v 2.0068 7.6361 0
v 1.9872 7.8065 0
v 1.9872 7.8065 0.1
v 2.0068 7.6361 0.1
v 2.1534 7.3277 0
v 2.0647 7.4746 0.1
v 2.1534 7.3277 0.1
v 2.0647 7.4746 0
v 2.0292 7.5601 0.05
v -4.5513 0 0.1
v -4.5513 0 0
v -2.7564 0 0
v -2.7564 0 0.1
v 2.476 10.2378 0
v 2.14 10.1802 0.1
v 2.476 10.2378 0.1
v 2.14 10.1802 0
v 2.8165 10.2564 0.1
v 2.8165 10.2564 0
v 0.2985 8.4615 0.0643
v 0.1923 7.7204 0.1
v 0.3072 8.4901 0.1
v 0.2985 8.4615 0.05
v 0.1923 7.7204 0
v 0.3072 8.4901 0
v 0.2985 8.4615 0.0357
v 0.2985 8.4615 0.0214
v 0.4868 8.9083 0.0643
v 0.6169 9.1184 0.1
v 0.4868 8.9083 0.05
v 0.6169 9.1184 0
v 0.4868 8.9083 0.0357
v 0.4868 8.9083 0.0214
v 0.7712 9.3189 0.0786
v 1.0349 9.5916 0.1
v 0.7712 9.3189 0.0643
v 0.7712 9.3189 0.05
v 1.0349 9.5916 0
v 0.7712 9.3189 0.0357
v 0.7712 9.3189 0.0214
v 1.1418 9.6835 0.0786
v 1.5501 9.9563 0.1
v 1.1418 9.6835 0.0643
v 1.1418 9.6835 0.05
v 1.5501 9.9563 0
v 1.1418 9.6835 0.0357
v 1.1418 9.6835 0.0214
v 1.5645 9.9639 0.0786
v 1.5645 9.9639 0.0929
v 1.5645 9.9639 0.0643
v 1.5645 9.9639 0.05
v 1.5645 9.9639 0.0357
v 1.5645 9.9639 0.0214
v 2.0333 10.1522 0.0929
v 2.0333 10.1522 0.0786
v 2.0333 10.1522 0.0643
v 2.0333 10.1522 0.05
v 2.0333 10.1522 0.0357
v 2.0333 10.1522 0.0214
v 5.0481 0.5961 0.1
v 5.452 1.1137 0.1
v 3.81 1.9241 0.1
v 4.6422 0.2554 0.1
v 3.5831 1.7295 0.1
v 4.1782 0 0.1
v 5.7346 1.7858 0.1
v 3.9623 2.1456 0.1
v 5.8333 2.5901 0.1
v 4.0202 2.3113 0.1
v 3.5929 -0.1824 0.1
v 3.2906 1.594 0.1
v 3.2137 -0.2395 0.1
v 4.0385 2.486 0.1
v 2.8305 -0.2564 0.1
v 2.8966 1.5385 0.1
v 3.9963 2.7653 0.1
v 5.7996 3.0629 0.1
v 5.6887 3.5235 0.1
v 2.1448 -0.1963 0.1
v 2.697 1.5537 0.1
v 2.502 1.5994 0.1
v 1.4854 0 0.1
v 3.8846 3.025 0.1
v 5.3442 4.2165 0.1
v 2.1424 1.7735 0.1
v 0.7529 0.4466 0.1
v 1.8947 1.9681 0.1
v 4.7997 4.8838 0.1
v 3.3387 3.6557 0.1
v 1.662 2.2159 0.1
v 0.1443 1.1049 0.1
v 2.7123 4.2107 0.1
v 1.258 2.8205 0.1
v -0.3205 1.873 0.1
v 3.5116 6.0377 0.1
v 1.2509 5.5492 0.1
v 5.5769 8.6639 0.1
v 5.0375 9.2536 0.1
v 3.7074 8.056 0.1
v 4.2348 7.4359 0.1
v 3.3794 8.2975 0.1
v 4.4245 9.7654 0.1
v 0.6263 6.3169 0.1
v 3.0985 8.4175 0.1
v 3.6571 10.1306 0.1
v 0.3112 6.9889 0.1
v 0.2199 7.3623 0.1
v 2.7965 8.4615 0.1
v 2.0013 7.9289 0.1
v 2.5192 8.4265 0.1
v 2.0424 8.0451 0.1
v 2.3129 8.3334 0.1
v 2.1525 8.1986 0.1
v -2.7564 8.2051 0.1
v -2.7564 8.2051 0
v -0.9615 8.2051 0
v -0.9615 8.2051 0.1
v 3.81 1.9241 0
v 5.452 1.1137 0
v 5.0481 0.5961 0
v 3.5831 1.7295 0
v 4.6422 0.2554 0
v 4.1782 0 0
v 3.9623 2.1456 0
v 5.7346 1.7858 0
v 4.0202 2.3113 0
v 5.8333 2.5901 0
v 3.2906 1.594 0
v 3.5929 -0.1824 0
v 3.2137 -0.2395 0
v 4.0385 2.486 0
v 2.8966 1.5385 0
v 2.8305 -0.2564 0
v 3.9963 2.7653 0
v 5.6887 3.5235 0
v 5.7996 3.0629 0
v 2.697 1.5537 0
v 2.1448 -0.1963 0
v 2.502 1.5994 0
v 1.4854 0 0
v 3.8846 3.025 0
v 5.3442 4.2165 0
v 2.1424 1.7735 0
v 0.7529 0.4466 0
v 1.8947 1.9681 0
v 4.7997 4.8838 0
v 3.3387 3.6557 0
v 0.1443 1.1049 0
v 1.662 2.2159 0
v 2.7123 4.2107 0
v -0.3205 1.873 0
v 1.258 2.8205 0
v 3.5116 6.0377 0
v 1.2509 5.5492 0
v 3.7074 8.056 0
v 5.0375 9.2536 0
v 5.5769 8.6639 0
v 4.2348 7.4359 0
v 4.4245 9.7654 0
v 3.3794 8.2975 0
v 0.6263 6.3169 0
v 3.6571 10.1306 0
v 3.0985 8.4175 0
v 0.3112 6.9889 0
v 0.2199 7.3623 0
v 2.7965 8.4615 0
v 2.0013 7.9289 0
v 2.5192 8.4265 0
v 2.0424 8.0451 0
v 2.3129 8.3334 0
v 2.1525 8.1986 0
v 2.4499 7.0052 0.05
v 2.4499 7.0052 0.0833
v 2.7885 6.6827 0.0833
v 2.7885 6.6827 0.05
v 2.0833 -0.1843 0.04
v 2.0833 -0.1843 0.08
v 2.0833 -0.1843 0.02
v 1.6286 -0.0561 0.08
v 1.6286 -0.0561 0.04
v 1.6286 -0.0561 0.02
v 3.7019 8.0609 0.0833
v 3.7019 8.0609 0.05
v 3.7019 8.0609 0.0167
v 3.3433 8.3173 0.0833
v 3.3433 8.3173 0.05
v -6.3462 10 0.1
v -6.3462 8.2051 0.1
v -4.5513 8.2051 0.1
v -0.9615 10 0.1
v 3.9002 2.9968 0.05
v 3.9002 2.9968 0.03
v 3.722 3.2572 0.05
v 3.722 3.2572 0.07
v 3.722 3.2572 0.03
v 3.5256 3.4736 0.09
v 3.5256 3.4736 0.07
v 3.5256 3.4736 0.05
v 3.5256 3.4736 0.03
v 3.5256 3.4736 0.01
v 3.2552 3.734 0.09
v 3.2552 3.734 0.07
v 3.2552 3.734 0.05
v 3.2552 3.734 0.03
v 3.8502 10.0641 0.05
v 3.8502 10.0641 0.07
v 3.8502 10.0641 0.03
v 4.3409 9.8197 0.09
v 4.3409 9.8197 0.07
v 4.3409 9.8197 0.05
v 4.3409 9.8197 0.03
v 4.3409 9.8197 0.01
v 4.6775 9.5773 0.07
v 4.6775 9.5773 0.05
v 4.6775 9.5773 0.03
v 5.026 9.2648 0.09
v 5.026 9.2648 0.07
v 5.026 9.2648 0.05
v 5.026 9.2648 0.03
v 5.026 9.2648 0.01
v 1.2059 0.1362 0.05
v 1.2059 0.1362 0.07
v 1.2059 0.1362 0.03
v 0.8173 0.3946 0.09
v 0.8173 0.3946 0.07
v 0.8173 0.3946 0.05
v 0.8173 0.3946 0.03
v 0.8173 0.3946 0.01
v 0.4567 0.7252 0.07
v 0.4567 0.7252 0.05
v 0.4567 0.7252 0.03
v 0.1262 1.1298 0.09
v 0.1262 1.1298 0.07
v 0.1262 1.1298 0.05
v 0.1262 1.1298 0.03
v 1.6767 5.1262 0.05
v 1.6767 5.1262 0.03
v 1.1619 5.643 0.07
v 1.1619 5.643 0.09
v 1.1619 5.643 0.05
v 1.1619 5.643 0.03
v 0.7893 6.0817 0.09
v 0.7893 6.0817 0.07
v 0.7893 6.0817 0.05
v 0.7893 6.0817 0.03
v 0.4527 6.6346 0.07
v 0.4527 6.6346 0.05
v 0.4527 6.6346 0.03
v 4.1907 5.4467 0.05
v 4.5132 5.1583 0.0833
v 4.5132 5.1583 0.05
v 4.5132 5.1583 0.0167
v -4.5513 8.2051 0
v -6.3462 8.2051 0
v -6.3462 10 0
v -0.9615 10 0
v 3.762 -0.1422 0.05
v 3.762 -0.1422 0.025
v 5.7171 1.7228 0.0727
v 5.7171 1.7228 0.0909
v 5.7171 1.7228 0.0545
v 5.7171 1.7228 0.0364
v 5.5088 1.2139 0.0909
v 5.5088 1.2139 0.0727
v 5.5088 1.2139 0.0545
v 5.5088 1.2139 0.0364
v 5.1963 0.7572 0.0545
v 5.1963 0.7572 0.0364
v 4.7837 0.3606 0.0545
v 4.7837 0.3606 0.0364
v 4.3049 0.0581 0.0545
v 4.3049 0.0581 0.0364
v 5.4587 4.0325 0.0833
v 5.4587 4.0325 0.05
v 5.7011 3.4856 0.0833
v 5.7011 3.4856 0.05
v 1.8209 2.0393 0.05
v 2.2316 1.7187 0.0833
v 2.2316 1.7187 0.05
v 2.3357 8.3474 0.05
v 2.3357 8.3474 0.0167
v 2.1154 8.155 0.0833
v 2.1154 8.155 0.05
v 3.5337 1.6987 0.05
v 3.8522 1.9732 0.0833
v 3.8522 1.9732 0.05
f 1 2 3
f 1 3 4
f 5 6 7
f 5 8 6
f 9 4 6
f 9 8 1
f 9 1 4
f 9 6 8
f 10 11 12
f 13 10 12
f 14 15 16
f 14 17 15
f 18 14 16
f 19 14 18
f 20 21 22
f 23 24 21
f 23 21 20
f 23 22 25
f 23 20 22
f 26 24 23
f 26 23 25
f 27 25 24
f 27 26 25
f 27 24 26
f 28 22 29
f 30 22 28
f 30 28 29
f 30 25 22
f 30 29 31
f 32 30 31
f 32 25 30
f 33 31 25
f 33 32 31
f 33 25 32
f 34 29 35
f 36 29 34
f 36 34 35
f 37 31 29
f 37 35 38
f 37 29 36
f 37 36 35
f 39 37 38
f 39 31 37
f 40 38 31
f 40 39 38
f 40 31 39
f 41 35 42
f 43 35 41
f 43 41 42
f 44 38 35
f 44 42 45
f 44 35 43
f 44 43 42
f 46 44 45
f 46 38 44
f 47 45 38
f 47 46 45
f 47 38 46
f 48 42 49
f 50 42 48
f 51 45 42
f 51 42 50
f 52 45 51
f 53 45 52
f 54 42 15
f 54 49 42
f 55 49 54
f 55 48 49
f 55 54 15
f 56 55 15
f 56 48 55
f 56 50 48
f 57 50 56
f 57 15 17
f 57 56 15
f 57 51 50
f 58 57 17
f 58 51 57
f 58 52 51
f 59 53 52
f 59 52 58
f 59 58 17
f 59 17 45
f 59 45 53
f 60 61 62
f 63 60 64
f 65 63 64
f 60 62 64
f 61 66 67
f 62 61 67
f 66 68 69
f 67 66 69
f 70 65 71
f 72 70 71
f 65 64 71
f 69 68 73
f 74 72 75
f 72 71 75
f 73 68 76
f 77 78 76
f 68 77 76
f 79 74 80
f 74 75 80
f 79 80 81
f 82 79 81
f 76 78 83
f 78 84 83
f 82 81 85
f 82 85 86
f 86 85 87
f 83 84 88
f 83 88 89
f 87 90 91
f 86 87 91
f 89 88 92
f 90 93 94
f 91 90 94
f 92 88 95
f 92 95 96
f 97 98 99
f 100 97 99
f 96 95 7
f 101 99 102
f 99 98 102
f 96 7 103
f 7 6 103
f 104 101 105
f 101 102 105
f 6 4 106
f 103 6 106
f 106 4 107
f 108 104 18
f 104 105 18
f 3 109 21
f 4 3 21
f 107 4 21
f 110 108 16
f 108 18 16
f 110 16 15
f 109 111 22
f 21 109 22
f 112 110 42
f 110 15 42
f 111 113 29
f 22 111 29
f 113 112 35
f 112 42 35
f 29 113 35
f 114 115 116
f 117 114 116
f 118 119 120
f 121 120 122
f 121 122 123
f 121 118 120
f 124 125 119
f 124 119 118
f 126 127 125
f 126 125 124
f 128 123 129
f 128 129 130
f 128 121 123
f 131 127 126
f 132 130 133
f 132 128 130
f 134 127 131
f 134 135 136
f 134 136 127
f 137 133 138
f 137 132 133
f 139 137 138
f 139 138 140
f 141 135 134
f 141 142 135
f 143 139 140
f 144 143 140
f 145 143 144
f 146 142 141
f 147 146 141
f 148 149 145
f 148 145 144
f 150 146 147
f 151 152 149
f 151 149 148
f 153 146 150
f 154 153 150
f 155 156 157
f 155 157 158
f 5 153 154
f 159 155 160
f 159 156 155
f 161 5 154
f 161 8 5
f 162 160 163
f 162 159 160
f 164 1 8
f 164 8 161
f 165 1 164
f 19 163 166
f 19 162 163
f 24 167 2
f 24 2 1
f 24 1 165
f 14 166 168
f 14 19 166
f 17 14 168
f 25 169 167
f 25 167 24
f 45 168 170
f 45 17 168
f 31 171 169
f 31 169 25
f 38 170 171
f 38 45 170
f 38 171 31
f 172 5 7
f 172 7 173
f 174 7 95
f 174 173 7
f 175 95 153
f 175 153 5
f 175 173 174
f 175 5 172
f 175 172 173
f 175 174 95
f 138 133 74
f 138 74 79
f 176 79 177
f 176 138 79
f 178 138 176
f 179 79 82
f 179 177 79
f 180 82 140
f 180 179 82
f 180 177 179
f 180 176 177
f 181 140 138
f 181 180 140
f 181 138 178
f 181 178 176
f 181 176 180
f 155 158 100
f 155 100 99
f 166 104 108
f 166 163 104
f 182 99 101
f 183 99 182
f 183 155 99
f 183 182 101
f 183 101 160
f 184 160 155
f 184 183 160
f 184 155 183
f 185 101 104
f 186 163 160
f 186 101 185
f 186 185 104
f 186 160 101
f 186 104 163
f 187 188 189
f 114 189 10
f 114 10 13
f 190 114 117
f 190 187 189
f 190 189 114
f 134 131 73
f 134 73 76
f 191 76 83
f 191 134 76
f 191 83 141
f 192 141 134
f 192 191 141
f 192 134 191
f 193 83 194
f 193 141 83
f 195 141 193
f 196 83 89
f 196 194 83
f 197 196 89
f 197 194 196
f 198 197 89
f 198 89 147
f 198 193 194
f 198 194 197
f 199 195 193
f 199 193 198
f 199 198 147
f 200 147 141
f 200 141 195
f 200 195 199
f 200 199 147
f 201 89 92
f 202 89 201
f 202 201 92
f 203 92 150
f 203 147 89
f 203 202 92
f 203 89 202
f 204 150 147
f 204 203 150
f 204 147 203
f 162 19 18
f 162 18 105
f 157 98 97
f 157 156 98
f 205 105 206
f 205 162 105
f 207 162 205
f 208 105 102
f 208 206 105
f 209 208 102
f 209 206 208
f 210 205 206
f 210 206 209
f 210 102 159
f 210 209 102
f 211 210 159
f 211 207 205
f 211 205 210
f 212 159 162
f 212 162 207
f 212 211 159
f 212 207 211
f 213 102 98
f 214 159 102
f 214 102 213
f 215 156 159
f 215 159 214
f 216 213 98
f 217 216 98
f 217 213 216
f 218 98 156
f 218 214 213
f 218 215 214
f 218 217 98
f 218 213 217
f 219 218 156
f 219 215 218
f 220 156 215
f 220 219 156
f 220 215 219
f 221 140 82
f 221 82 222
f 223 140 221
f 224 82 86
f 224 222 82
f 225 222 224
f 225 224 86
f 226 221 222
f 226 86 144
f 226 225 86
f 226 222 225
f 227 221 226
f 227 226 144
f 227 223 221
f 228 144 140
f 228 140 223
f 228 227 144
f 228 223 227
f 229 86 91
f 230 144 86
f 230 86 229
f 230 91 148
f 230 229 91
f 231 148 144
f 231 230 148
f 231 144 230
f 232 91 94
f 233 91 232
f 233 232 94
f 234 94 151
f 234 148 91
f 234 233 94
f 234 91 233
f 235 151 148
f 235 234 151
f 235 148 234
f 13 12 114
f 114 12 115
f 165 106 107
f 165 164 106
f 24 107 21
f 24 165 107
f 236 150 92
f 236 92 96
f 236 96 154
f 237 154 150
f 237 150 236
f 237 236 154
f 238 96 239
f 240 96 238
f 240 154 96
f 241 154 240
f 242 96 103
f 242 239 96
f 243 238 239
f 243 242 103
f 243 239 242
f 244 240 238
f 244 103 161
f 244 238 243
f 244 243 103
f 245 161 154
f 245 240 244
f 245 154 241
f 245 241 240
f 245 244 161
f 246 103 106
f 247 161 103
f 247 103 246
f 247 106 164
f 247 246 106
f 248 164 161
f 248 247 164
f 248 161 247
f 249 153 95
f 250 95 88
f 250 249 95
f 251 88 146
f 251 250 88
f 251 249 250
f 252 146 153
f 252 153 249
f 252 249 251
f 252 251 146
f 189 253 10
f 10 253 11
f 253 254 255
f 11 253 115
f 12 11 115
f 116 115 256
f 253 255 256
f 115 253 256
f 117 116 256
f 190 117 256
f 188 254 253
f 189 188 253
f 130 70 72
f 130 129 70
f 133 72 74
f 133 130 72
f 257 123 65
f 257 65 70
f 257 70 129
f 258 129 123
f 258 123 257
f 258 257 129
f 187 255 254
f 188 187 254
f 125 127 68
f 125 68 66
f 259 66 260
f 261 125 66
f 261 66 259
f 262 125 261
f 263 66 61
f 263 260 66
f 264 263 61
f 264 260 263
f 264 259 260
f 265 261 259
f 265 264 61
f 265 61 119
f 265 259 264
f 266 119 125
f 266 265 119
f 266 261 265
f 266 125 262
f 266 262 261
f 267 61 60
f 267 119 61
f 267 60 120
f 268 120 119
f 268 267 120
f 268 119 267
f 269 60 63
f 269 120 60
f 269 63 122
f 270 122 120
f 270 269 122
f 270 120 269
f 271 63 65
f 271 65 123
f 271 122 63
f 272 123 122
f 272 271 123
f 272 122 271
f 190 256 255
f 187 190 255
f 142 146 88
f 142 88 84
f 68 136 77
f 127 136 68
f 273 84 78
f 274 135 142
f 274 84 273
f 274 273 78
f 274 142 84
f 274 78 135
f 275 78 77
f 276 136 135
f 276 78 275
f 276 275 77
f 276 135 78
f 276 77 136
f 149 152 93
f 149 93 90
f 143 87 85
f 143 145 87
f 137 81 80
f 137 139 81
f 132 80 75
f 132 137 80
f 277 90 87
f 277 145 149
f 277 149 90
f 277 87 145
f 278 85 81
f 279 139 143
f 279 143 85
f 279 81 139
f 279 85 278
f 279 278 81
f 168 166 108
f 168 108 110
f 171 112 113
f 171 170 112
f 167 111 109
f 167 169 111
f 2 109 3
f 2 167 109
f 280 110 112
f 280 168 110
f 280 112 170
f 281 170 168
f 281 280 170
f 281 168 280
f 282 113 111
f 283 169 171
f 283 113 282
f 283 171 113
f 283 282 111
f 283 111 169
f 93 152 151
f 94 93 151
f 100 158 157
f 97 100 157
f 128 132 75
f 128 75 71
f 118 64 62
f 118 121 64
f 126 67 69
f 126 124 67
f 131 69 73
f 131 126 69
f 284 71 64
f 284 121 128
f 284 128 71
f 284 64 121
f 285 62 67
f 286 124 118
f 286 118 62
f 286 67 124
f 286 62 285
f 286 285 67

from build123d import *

# Parameters (mm, degrees)
BOSS_EXTRUDE2_DEPTH = 0.1


with BuildPart() as part:
    # Sketch2 → Boss-Extrude2 (new body)
    with BuildSketch(Plane.XY):
        Polygon((-4.551282051, 8.205128205), (-4.551282051, 0), (-2.756410256, 0), (-2.756410256, 8.205128205), (-0.961538462, 8.205128205), (-0.961538462, 10), (-6.346153846, 10), (-6.346153846, 8.205128205), align=None)
        with BuildLine():
            add(Edge.make_bspline(
                [(1.48535153, 0), (1.460838, 0.010341081), (1.365882722, 0.051957676), (1.204347305, 0.133873582), (1.004767059, 0.254125506), (0.813884947, 0.393754262), (0.629286771, 0.549904551), (0.452808355, 0.724978918), (0.28359341, 0.918560312), (0.122758915, 1.13120867), (-0.092314067, 1.442815496), (-0.230504116, 1.697851295), (-0.320512821, 1.872996795)],
                knots=[0.341462315, 0.341462315, 0.341462315, 0.341462315, 0.361230317, 0.418489049, 0.475936712, 0.534203744, 0.594059429, 0.655468694, 0.718771685, 0.784974607, 0.853522316, 1, 1, 1, 1], degree=3))
            Line((1.48535153, 0), (4.178150333, 0))
            add(Edge.make_bspline(
                [(5.833333333, 2.590144231), (5.836556379, 2.39177757), (5.807396557, 2.099692324), (5.723575496, 1.723504993), (5.628862822, 1.461460195), (5.51323848, 1.210595134), (5.368337987, 0.974811142), (5.198159092, 0.75172373), (5.003111445, 0.545320229), (4.787364674, 0.358023886), (4.555955915, 0.191286396), (4.349328922, 0.077208292), (4.220859594, 0.018318592), (4.178150333, 0)],
                knots=[0, 0, 0, 0, 0.127926544, 0.18904691, 0.248543693, 0.307607127, 0.36724766, 0.426963056, 0.488617128, 0.550391855, 0.611330734, 0.672556085, 0.702571181, 0.702571181, 0.702571181, 0.702571181], degree=3))
            add(Edge.make_bspline(
                [(4.799679487, 4.883814103), (4.972046146, 4.70296104), (5.207229977, 4.429216435), (5.459741281, 4.042091474), (5.600250109, 3.765825955), (5.706202322, 3.487069286), (5.807580629, 3.098571269), (5.833539424, 2.794864513), (5.833333333, 2.590144231)],
                knots=[0, 0, 0, 0, 0.289954183, 0.417138648, 0.535255184, 0.648751095, 0.762405462, 1, 1, 1, 1], degree=3))
            add(Edge.make_bspline(
                [(3.51161859, 6.037660256), (3.670834794, 5.899015153), (3.899126567, 5.704240516), (4.182132498, 5.454181599), (4.357136314, 5.300080319), (4.504850468, 5.166660423), (4.650147699, 5.030820488), (4.745616907, 4.939283835), (4.799679487, 4.883814103)],
                knots=[0, 0, 0, 0, 0.366184141, 0.520457298, 0.655012135, 0.770624226, 0.865677185, 1, 1, 1, 1], degree=3))
            add(Edge.make_bspline(
                [(2.153445513, 7.327724359), (2.20461199, 7.259389428), (2.304218944, 7.152286409), (2.457147154, 6.996386214), (2.61452056, 6.847270221), (2.79617707, 6.673533424), (3.099171859, 6.402290717), (3.339999163, 6.187066649), (3.51161859, 6.037660256)],
                knots=[0, 0, 0, 0, 0.136349281, 0.233805212, 0.349411224, 0.48317915, 0.635966856, 1, 1, 1, 1], degree=3))
            add(Edge.make_bspline(
                [(1.987179487, 7.806490385), (1.985948248, 7.722541703), (2.017859782, 7.551251278), (2.101226417, 7.398634388), (2.153445513, 7.327724359)],
                knots=[0, 0, 0, 0, 0.487115475, 1, 1, 1, 1], degree=3))
            add(Edge.make_bspline(
                [(2.796474359, 8.461538462), (2.68723449, 8.461714305), (2.524417496, 8.442214992), (2.333502672, 8.351111674), (2.21199816, 8.264653628), (2.115884267, 8.160406635), (2.014811587, 8.017284715), (1.9881325, 7.88877723), (1.987179487, 7.806490385)],
                knots=[0, 0, 0, 0, 0.285992887, 0.416634394, 0.547379946, 0.671582838, 0.784400739, 1, 1, 1, 1], degree=3))
            add(Edge.make_bspline(
                [(4.234775641, 7.435897436), (4.12736706, 7.593471623), (3.958618898, 7.811040737), (3.70986163, 8.058990936), (3.530965751, 8.205548604), (3.349577267, 8.319578363), (3.110164479, 8.425885094), (2.920733401, 8.461946352), (2.796474359, 8.461538462)],
                knots=[0, 0, 0, 0, 0.31182434, 0.448432767, 0.573381197, 0.689077147, 0.797572901, 1, 1, 1, 1], degree=3))
            Line((4.234775641, 7.435897436), (5.576923077, 8.663862179))
            add(Edge.make_bspline(
                [(2.81650641, 10.256410256), (3.0513038, 10.256292599), (3.403416621, 10.212218251), (3.855042582, 10.070634701), (4.128190391, 9.943420306), (4.345527336, 9.820002318), (4.512096474, 9.706401822), (4.681587602, 9.576257291), (4.855377135, 9.429174971), (5.030196996, 9.262349729), (5.278560846, 9.011944158), (5.458546374, 8.807844761), (5.576923077, 8.663862179)],
                knots=[0, 0, 0, 0, 0.212976528, 0.319776676, 0.428556273, 0.485856803, 0.546558687, 0.611431498, 0.67982091, 0.753158505, 0.830752869, 1, 1, 1, 1], degree=3))
            add(Edge.make_bspline(
                [(0.192307692, 7.720352564), (0.19131912, 7.88910687), (0.216578448, 8.13930841), (0.293923062, 8.461944309), (0.376557185, 8.691675585), (0.483969479, 8.911542905), (0.614375956, 9.122625311), (0.769847066, 9.322979283), (0.945049541, 9.512472357), (1.138078595, 9.68564699), (1.344354539, 9.838492639), (1.562709715, 9.967582214), (1.791809645, 10.074693926), (2.033068803, 10.156597321), (2.373429116, 10.235543149), (2.63819748, 10.255302337), (2.81650641, 10.256410256)],
                knots=[0, 0, 0, 0, 0.12445736, 0.184840915, 0.244566821, 0.304319173, 0.365199786, 0.427420983, 0.491261689, 0.555499002, 0.618604518, 0.680494764, 0.742473305, 0.804990665, 0.868251971, 1, 1, 1, 1], degree=3))
            add(Edge.make_bspline(
                [(2.712339744, 4.210737179), (2.467156852, 4.416370493), (2.118357969, 4.717619446), (1.68447951, 5.115741965), (1.410224639, 5.384601459), (1.169326136, 5.632074114), (0.963388609, 5.860145575), (0.794699819, 6.070581437), (0.617131528, 6.319825882), (0.448753138, 6.623562109), (0.256721231, 7.101050655), (0.189683045, 7.474524767), (0.192307692, 7.720352564)],
                knots=[0, 0, 0, 0, 0.215201009, 0.309902452, 0.395959096, 0.473447494, 0.542140328, 0.602523333, 0.654726333, 0.747804055, 0.835278417, 1, 1, 1, 1], degree=3))
            add(Edge.make_bspline(
                [(4.038461538, 2.485977564), (4.038193412, 2.602203821), (4.003149727, 2.779154786), (3.902059828, 3.003569285), (3.811091696, 3.144877639), (3.71834138, 3.263183969), (3.629680561, 3.365692423), (3.52170512, 3.478945606), (3.394701187, 3.603088004), (3.250338094, 3.739205714), (3.023866562, 3.9464868), (2.840615244, 4.102893683), (2.712339744, 4.210737179)],
                knots=[0, 0, 0, 0, 0.155090822, 0.238351561, 0.32840414, 0.37938386, 0.439617644, 0.509831416, 0.588874645, 0.677436354, 0.77554672, 1, 1, 1, 1], degree=3))
            add(Edge.make_bspline(
                [(2.896634615, 1.538461538), (3.047463771, 1.53731824), (3.269664059, 1.571565235), (3.538566079, 1.692789273), (3.709432682, 1.819011458), (3.853828989, 1.964890474), (3.995392385, 2.178492725), (4.040601083, 2.363899381), (4.038461538, 2.485977564)],
                knots=[0, 0, 0, 0, 0.275473311, 0.404345843, 0.535429711, 0.661427401, 0.77786684, 1, 1, 1, 1], degree=3))
            add(Edge.make_bspline(
                [(1.258012821, 2.820512821), (1.365522326, 2.62415139), (1.540337666, 2.35222131), (1.811389641, 2.040605962), (2.014408695, 1.858490427), (2.224152025, 1.715672647), (2.510931219, 1.579950245), (2.743224957, 1.538145131), (2.896634615, 1.538461538)],
                knots=[0, 0, 0, 0, 0.307611547, 0.442138888, 0.566229194, 0.681222208, 0.789558005, 1, 1, 1, 1], degree=3))
            Line((1.258012821, 2.820512821), (-0.320512821, 1.872996795))
        make_face()
        with BuildLine():
            Line((4.178150333, 0), (1.48535153, 0))
            add(Edge.make_bspline(
                [(2.830528846, -0.256410256), (2.661174485, -0.256281445), (2.410402104, -0.241468047), (2.084880675, -0.187714321), (1.852665495, -0.131016828), (1.653610065, -0.067214648), (1.532603593, -0.019933376), (1.48535153, 0)],
                knots=[0, 0, 0, 0, 0.125868382, 0.18624025, 0.244976651, 0.303357688, 0.341462315, 0.341462315, 0.341462315, 0.341462315], degree=3))
            add(Edge.make_bspline(
                [(4.178150333, 0), (4.133395026, -0.01919617), (3.997065846, -0.073547257), (3.760715706, -0.146970814), (3.358063757, -0.235150464), (3.043584773, -0.256804432), (2.830528846, -0.256410256)],
                knots=[0.702571181, 0.702571181, 0.702571181, 0.702571181, 0.734024191, 0.797340621, 0.862249627, 1, 1, 1, 1], degree=3))
        make_face()
    extrude(amount=BOSS_EXTRUDE2_DEPTH)


solid = part.part
